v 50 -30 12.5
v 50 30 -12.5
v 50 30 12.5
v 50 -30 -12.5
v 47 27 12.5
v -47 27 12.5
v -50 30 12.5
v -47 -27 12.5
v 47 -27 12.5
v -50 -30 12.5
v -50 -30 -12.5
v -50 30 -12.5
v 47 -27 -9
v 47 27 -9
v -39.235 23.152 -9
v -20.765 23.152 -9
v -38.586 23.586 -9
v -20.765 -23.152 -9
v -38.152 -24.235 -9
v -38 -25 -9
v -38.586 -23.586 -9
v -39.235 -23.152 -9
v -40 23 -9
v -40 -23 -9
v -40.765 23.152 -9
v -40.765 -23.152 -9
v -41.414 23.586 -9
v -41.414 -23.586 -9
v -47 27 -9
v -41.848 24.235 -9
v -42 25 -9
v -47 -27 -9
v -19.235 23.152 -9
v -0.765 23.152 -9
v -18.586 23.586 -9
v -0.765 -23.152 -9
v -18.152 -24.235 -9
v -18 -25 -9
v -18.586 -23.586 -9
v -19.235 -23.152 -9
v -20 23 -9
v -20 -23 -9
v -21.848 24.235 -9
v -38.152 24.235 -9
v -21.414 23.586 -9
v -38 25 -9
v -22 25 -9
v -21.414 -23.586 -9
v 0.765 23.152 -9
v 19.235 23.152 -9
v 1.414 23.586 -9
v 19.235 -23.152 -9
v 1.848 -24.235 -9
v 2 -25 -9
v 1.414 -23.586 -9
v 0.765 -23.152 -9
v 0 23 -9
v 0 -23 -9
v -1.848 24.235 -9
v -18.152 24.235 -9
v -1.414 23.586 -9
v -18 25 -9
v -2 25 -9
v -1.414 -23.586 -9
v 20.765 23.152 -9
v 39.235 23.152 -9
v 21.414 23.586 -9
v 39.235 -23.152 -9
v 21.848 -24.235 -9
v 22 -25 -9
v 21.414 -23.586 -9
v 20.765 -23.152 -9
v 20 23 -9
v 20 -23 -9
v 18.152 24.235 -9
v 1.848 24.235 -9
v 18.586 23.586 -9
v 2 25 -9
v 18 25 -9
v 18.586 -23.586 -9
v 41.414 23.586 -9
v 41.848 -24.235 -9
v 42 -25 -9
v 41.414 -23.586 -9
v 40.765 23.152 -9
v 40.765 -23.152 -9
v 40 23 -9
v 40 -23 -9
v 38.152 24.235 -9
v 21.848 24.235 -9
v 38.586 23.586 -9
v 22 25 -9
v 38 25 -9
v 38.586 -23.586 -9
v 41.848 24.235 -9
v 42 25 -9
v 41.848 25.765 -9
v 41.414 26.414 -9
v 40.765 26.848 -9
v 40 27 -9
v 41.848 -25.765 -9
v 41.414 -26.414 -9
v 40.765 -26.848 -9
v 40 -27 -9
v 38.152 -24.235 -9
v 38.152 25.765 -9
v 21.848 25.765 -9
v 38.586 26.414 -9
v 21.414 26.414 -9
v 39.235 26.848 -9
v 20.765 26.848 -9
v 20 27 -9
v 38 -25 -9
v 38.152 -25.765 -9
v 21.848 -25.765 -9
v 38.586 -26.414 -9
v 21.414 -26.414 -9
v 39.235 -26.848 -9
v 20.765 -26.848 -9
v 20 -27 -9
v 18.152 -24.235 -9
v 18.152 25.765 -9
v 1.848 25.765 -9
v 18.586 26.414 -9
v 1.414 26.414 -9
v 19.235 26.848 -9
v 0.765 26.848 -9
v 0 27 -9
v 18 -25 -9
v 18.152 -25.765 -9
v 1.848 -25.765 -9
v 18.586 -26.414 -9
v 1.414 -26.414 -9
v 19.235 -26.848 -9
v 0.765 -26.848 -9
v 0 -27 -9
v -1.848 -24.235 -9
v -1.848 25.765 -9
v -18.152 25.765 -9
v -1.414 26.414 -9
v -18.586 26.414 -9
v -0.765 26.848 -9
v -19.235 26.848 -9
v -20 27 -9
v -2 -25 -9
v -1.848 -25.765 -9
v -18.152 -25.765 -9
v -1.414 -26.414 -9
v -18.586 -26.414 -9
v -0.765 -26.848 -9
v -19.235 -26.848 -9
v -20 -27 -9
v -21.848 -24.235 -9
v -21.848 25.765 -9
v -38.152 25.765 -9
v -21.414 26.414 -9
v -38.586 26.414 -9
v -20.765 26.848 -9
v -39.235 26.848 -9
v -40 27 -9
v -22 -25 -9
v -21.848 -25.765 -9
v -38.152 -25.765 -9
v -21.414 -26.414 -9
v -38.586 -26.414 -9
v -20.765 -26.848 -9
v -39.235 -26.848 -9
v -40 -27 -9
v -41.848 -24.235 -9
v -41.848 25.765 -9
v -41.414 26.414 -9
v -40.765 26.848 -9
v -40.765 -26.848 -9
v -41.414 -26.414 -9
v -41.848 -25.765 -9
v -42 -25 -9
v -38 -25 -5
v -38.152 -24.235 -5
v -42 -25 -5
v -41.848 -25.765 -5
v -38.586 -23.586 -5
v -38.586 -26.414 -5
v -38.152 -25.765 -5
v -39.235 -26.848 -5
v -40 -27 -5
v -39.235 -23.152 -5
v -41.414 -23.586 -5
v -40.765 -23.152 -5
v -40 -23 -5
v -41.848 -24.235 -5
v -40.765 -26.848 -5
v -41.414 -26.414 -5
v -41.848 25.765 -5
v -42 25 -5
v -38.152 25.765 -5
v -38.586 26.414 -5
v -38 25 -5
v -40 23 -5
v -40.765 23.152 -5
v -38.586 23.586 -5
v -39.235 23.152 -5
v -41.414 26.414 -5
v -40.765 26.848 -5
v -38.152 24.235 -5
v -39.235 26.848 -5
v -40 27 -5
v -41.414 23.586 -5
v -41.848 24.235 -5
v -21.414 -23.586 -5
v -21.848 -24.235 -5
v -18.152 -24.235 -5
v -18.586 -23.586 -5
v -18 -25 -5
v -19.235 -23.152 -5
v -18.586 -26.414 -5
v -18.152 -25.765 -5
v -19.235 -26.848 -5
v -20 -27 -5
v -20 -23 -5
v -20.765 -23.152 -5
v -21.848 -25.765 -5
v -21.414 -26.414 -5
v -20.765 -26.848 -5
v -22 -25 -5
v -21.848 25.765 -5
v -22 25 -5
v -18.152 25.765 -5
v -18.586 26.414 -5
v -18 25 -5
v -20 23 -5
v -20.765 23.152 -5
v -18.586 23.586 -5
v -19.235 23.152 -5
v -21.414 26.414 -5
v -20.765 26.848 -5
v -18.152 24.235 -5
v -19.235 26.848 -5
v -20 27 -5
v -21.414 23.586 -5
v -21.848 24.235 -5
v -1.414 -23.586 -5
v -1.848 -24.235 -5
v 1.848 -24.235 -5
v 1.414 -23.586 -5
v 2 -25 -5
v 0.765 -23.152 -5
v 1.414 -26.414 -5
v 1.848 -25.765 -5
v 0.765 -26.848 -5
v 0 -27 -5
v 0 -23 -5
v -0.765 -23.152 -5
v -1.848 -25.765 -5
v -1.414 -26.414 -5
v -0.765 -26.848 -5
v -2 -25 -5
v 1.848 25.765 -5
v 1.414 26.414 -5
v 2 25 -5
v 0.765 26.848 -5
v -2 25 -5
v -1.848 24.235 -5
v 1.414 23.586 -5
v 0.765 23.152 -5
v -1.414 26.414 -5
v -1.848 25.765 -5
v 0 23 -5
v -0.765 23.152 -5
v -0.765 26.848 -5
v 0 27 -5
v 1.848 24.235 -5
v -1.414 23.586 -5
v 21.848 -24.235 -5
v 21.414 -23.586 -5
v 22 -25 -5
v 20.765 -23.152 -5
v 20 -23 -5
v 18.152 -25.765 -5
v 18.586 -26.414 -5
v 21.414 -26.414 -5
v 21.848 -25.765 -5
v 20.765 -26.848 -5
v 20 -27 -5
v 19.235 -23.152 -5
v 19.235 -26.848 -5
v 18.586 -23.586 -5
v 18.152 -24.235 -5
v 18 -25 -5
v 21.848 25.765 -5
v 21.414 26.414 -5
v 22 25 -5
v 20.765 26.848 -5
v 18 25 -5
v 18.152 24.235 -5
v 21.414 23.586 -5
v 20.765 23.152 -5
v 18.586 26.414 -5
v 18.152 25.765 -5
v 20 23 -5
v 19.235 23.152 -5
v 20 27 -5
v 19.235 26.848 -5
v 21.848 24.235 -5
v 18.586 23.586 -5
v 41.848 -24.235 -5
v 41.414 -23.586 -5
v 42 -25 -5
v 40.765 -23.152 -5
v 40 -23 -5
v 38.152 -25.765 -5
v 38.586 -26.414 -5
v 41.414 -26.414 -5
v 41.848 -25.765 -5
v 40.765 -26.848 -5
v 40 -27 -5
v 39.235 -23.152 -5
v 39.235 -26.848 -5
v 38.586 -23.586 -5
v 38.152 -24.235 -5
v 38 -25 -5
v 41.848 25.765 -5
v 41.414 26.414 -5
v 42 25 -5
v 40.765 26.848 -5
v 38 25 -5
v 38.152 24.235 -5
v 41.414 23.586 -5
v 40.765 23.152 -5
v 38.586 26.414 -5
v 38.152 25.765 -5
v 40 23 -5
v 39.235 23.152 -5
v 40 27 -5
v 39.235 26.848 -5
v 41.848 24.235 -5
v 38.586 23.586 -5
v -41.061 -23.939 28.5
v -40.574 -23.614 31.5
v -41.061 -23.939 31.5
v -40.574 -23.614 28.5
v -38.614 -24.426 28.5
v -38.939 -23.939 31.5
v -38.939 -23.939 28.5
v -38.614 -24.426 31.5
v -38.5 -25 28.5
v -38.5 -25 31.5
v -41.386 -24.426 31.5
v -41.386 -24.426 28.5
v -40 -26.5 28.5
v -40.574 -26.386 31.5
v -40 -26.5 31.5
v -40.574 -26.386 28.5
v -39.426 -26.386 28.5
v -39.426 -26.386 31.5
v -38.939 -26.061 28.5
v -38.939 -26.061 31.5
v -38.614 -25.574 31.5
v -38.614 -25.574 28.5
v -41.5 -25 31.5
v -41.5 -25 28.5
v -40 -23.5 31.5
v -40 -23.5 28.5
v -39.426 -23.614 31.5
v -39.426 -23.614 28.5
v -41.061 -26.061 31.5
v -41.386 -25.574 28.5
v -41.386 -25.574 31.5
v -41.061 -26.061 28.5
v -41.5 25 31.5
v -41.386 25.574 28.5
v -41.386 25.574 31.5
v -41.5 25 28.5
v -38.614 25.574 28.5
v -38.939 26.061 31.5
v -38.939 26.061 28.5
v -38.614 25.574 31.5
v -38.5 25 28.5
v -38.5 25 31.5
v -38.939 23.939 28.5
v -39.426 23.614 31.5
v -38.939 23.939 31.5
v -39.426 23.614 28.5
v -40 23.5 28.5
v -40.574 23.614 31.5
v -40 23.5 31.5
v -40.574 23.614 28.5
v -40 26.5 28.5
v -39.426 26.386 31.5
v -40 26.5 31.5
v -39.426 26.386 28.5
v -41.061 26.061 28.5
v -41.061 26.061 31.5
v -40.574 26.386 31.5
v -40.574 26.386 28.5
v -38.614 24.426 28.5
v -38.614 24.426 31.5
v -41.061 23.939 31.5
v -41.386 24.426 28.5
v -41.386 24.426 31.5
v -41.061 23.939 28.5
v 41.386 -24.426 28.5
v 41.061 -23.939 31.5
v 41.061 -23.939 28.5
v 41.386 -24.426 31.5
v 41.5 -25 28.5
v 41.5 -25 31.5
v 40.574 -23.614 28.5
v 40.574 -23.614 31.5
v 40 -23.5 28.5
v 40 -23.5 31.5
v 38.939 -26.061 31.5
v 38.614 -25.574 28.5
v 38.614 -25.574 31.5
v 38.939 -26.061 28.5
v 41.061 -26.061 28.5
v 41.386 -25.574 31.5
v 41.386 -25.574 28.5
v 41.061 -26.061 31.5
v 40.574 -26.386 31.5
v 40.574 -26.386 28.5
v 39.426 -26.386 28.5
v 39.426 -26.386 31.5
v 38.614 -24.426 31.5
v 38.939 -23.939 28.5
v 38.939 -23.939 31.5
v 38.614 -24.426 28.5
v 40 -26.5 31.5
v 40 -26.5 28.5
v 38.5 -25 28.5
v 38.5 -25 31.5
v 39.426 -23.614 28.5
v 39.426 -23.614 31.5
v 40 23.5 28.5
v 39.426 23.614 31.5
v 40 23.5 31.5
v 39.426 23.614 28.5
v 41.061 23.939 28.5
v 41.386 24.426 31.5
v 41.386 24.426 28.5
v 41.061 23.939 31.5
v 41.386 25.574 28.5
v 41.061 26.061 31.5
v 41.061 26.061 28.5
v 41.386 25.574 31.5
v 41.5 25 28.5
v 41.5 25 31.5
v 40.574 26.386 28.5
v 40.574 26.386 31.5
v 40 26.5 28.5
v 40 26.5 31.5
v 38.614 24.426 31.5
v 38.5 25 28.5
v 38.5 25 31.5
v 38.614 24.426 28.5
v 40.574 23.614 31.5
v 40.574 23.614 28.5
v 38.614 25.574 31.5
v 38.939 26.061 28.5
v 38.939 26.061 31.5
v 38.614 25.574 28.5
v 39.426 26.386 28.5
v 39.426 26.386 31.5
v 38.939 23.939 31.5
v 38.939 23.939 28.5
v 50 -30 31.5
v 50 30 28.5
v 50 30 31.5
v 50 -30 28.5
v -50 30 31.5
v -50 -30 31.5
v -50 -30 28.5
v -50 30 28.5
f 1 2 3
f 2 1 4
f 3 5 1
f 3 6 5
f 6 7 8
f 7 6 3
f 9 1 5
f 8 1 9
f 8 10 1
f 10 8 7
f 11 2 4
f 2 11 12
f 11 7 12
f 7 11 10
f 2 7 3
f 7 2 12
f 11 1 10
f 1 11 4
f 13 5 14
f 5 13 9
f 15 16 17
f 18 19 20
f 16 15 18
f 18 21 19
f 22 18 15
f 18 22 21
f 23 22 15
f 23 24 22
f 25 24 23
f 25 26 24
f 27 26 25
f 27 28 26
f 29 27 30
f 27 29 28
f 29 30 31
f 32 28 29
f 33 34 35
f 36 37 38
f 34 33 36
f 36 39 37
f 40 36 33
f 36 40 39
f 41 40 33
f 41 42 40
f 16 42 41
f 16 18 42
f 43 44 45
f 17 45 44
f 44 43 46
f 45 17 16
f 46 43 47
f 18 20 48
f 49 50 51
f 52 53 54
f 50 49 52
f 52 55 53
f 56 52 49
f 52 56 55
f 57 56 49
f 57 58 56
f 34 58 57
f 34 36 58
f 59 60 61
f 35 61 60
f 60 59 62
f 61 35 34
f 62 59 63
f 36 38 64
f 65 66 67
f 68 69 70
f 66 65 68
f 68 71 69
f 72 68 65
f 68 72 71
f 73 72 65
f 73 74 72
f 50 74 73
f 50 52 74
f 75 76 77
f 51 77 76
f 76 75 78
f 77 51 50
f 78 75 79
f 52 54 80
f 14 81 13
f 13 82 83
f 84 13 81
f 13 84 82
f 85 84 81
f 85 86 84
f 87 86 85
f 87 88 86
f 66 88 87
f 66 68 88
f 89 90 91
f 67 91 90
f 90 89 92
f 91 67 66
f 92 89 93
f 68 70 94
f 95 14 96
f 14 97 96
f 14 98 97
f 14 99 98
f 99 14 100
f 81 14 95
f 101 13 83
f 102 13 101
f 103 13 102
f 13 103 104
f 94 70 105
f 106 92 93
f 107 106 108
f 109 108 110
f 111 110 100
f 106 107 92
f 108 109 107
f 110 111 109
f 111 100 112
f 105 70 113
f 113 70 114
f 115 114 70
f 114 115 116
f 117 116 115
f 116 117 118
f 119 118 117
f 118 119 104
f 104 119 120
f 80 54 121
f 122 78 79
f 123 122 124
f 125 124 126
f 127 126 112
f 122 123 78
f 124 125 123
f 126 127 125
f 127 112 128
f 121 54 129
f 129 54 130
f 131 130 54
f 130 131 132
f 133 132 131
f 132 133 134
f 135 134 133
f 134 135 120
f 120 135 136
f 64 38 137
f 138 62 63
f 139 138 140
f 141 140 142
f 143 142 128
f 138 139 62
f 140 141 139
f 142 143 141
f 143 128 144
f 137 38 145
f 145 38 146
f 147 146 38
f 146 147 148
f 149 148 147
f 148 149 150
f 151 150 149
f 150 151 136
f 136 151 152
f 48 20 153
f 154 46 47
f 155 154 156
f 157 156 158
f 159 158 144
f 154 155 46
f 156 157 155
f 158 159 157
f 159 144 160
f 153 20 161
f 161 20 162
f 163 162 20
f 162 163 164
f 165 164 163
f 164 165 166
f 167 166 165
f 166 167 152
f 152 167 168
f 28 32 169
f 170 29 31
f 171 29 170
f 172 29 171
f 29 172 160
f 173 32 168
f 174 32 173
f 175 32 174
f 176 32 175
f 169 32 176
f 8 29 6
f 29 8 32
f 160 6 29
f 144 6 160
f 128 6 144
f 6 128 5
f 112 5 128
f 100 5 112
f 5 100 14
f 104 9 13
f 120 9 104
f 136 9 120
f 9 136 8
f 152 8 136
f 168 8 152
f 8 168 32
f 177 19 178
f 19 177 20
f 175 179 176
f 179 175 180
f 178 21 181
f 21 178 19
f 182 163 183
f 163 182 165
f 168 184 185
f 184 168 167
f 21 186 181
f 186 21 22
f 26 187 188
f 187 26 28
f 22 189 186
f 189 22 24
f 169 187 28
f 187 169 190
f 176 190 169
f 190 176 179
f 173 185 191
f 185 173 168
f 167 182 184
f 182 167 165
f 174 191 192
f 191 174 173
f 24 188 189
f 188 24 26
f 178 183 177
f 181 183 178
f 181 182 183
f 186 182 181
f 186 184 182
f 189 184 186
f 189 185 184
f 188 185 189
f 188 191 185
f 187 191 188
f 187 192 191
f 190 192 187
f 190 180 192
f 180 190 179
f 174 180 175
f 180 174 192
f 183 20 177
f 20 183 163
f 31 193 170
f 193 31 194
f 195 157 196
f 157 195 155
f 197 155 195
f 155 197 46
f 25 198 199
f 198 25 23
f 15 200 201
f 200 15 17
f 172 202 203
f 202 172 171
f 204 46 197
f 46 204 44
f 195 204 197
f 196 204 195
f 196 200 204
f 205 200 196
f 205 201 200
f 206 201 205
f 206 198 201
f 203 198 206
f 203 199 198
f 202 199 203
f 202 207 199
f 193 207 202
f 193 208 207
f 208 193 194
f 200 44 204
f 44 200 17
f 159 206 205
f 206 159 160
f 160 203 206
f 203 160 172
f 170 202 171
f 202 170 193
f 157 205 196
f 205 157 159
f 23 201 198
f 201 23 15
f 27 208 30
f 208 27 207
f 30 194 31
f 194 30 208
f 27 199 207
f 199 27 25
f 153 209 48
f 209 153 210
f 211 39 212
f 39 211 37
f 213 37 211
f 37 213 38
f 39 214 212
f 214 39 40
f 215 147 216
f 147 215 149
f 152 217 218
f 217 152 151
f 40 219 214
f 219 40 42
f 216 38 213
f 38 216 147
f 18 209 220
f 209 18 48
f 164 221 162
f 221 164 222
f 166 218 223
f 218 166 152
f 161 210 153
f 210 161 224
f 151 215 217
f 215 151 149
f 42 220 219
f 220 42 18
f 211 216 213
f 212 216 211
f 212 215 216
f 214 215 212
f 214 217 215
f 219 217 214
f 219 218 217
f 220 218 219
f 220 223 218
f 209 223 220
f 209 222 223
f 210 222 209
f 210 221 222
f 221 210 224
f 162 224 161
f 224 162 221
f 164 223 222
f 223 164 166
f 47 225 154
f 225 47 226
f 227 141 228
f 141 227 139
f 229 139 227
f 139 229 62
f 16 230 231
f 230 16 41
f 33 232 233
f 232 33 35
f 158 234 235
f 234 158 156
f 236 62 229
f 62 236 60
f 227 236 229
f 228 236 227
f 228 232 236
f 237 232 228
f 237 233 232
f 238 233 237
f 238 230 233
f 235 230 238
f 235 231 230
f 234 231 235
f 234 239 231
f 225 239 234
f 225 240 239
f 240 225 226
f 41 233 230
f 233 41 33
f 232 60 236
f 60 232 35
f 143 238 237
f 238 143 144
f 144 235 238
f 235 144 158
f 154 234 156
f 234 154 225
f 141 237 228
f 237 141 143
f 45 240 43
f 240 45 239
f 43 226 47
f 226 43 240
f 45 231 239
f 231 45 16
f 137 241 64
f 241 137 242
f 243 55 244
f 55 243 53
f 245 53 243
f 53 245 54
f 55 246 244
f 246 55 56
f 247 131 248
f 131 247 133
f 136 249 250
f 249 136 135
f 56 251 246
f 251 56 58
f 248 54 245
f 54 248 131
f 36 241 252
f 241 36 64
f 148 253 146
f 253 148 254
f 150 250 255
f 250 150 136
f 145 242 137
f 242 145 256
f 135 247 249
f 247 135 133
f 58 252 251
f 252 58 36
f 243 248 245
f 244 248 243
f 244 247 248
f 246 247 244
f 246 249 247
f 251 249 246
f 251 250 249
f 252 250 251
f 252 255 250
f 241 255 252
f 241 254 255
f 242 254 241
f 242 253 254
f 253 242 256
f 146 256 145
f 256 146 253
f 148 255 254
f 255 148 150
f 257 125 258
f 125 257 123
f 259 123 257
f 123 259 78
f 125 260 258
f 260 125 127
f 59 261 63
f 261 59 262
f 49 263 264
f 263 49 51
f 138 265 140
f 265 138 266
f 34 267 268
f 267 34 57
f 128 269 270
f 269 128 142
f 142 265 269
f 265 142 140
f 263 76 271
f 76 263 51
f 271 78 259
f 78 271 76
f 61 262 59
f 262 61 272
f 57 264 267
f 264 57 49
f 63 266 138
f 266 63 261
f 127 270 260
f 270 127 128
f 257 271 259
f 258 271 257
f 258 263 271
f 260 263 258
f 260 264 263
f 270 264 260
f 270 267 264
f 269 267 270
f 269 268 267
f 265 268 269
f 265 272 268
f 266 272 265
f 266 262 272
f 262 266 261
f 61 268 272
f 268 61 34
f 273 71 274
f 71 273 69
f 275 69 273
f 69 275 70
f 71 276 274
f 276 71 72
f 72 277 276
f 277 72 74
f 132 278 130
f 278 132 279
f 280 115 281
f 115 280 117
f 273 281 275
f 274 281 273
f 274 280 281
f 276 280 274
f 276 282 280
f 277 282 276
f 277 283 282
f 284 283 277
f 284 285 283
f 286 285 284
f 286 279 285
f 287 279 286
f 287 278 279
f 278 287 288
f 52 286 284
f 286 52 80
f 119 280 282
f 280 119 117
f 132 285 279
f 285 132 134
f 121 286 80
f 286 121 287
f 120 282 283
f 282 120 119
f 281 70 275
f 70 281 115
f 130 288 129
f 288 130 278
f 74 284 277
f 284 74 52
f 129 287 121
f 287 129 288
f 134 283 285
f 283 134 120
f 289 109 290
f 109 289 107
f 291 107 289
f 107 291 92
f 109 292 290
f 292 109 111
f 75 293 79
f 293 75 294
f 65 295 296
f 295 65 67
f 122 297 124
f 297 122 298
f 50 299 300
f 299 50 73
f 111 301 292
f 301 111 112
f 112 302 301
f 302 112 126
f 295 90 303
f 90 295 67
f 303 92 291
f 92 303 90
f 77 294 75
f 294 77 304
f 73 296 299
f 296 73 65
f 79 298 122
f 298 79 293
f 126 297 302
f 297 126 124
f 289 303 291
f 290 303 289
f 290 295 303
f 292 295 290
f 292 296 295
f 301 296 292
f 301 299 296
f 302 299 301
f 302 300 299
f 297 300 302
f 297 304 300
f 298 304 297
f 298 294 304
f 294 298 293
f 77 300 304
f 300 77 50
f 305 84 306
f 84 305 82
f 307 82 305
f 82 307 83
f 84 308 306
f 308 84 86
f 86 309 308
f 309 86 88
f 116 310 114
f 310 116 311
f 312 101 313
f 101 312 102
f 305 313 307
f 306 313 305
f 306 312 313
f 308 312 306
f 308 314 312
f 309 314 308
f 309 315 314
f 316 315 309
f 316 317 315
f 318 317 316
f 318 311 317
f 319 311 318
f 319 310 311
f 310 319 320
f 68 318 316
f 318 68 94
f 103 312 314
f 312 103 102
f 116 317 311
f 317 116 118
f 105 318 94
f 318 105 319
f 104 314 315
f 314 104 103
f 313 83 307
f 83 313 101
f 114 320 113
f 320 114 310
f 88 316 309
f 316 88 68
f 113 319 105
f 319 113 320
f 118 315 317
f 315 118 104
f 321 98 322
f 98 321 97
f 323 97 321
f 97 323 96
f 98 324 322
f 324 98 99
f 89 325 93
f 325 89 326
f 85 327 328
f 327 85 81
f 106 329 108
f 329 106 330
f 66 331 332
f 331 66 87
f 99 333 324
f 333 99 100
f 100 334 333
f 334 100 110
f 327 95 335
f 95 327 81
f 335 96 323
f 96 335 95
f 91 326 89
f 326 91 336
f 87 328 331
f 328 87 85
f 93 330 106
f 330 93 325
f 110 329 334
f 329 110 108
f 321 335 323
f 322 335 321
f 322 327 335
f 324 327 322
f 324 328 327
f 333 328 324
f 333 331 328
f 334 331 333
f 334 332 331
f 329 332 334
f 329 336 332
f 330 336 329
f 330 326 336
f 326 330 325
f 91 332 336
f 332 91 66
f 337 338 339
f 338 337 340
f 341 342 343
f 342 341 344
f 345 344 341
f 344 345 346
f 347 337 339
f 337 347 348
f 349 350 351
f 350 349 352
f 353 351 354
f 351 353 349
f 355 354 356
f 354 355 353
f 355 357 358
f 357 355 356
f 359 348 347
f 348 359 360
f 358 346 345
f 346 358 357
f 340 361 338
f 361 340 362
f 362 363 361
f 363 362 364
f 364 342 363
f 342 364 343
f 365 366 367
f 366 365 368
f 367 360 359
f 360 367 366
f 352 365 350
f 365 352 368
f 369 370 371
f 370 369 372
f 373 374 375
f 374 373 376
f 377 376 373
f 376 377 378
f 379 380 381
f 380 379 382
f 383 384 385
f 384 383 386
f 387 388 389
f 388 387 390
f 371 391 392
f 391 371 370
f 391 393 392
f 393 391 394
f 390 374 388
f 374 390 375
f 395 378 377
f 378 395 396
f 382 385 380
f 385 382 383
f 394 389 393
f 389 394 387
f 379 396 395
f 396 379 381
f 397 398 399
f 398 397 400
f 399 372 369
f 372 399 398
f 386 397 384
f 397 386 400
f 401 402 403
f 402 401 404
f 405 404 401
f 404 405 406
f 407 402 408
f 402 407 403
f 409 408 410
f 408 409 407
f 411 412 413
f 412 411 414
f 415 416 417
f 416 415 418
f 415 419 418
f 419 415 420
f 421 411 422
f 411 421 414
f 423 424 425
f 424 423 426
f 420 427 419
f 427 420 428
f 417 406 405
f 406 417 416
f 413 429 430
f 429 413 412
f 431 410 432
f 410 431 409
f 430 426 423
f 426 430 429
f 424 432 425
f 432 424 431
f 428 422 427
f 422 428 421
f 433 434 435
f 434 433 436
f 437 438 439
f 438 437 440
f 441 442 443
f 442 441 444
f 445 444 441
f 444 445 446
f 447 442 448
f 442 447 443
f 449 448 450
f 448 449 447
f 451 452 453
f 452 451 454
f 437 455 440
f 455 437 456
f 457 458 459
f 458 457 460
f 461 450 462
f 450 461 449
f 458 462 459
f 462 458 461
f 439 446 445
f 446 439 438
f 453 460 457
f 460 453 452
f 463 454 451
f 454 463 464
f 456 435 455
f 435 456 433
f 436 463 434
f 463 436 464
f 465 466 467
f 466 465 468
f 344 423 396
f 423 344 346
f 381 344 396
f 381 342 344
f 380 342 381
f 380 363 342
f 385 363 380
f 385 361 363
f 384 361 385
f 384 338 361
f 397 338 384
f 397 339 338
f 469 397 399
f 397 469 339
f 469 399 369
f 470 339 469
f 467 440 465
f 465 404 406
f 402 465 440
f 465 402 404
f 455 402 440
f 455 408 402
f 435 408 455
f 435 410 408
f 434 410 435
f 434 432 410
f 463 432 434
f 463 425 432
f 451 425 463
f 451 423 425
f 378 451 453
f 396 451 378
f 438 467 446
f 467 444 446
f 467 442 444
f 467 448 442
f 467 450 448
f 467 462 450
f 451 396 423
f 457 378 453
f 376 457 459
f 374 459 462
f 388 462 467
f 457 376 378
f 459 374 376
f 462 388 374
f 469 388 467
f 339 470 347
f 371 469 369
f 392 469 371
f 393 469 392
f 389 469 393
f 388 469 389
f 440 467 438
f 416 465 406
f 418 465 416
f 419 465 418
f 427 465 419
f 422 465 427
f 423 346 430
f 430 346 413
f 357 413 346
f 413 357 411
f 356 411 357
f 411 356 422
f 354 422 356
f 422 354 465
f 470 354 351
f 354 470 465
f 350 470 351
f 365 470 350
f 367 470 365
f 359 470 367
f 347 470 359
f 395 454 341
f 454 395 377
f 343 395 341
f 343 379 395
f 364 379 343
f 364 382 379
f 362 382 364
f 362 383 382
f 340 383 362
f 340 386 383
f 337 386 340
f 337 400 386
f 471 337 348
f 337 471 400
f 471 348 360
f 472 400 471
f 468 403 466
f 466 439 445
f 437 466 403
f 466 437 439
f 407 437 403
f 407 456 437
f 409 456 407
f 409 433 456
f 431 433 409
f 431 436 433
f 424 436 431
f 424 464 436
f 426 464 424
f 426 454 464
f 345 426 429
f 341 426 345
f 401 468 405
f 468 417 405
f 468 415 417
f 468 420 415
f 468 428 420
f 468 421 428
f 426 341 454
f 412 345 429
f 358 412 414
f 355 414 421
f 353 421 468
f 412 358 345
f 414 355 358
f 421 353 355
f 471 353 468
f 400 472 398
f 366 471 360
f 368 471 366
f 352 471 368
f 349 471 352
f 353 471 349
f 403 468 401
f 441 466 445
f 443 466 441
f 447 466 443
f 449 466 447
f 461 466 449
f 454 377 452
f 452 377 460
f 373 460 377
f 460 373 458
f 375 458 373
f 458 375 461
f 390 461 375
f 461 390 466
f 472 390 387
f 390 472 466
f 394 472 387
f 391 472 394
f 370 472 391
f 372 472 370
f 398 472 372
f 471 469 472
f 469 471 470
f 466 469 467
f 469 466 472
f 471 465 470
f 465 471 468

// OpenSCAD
// ZrenieBPPLA-5 Lot 5.3
module body() { difference() { cube([100,60,25],center=true); translate([0,0,2]) cube([94,54,22],center=true); } }
module mounts() { for(x=[-40,-20,0,20,40]) { translate([x,-25,-10]) cylinder(h=5,r=2,$fn=16); translate([x,25,-10]) cylinder(h=5,r=2,$fn=16); } }
module lid() { translate([0,0,30]) difference() { cube([100,60,3],center=true); for(x=[-40,40]) for(y=[-25,25]) translate([x,y,0]) cylinder(h=5,r=1.5,center=true,$fn=16); } }
color("SteelBlue") body(); color("Gold") mounts(); color("LightBlue",0.7) lid();
